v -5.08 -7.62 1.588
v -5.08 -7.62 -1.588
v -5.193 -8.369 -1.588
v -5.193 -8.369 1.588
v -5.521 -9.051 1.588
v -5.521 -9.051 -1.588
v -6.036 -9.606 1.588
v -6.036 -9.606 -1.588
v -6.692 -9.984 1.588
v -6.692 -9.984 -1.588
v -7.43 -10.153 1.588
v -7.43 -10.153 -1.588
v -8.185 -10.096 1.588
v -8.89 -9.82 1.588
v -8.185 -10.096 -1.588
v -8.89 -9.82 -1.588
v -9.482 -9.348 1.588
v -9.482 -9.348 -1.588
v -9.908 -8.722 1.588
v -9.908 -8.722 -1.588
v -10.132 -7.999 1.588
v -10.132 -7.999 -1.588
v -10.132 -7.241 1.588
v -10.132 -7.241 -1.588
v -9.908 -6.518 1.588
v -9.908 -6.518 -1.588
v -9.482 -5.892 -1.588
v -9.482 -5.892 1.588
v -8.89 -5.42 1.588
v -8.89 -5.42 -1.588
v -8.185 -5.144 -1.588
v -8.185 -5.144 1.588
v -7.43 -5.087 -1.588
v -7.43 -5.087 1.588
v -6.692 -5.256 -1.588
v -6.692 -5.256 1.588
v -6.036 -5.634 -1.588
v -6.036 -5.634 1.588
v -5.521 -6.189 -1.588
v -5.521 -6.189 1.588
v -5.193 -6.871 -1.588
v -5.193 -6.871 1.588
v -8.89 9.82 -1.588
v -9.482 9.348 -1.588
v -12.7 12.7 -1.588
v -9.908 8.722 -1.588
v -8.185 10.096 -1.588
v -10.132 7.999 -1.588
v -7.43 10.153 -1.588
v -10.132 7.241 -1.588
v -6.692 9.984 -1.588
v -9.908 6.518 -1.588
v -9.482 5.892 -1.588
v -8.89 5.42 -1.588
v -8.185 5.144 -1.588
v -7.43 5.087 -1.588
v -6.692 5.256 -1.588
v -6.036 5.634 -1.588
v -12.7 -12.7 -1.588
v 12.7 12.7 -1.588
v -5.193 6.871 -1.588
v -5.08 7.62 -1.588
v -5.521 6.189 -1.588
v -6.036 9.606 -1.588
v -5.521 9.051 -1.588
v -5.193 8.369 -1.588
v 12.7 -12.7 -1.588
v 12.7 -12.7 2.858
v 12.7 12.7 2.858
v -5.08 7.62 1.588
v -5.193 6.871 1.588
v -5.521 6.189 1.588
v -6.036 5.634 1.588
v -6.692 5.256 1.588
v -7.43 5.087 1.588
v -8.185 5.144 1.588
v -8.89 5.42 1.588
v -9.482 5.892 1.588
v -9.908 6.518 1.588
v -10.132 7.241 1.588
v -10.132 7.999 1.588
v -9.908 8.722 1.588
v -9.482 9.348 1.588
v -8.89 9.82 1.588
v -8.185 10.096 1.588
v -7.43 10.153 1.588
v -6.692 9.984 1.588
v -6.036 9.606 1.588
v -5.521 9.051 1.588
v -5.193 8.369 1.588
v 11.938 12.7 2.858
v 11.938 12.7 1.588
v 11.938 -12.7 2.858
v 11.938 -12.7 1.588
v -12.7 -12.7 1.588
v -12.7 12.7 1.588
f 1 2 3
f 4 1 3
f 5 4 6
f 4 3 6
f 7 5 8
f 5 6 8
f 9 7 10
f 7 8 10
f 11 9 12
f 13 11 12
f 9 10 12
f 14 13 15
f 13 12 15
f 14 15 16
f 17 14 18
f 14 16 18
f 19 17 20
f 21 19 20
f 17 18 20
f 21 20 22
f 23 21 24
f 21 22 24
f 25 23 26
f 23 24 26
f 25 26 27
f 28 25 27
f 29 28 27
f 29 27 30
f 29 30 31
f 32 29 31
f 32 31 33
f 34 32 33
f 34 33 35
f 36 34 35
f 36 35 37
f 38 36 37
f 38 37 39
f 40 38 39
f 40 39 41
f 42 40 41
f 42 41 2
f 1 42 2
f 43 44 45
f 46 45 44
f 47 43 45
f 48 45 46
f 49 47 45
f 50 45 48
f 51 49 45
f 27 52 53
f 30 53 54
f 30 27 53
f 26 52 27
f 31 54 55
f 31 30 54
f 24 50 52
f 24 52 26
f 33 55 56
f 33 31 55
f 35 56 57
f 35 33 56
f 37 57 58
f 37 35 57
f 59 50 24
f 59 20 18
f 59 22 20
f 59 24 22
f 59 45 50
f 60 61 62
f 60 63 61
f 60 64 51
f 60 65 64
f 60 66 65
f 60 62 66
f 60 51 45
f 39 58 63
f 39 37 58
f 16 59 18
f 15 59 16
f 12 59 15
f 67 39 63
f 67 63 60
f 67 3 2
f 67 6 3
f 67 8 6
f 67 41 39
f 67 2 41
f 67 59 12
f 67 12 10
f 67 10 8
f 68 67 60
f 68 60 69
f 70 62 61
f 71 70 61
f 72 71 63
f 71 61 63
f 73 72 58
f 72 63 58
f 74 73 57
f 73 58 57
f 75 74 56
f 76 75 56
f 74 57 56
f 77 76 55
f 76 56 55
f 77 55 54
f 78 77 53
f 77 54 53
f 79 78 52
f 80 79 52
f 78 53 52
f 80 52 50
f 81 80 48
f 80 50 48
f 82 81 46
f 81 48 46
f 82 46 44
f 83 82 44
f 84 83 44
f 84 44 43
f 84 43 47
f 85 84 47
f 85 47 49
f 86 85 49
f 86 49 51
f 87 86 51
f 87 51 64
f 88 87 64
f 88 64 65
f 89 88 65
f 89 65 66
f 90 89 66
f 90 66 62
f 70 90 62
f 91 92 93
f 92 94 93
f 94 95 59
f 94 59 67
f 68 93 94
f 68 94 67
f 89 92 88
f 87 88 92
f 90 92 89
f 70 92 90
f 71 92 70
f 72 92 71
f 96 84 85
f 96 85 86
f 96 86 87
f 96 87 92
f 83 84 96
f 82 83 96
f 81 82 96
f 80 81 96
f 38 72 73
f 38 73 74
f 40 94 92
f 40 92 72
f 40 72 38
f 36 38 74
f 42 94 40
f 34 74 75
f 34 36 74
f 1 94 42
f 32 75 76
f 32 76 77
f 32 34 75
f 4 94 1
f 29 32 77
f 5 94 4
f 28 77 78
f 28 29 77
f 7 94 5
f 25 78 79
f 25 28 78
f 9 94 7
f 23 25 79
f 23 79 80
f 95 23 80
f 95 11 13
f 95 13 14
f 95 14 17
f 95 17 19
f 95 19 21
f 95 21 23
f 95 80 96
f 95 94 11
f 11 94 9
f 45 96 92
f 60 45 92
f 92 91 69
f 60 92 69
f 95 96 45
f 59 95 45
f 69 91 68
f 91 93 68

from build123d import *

# Parameters (mm, degrees)
F0_W     = 0.762
F0_H     = 1.27
F1_DEPTH = 12.7
F2_R     = 2.54
F3_DEPTH = 4.446


with BuildPart() as f1:
    # F0 (on Front) → F1 (new body, symmetric)
    with BuildSketch(Plane.XZ):
        Polygon((11.938, 1.5875), (-12.7, 1.5875), (-12.7, -1.5875), (12.7, -1.5875), (12.7, 1.5875), align=None)
        with Locations((12.319, 2.2225)):
            Rectangle(F0_W, F0_H)
    extrude(amount=F1_DEPTH, both=True)

    # F2 (on face) → F3 (cut, through all)
    with BuildSketch(Plane(origin=(0, 0, -1.5875), x_dir=(1, 0, 0), z_dir=(0, 0, -1))):
        with Locations((-7.62, 7.62)):
            Circle(F2_R)
        with Locations((-7.62, -7.62)):
            Circle(F2_R)
    extrude(amount=-F3_DEPTH, mode=Mode.SUBTRACT)


solid = f1.part
